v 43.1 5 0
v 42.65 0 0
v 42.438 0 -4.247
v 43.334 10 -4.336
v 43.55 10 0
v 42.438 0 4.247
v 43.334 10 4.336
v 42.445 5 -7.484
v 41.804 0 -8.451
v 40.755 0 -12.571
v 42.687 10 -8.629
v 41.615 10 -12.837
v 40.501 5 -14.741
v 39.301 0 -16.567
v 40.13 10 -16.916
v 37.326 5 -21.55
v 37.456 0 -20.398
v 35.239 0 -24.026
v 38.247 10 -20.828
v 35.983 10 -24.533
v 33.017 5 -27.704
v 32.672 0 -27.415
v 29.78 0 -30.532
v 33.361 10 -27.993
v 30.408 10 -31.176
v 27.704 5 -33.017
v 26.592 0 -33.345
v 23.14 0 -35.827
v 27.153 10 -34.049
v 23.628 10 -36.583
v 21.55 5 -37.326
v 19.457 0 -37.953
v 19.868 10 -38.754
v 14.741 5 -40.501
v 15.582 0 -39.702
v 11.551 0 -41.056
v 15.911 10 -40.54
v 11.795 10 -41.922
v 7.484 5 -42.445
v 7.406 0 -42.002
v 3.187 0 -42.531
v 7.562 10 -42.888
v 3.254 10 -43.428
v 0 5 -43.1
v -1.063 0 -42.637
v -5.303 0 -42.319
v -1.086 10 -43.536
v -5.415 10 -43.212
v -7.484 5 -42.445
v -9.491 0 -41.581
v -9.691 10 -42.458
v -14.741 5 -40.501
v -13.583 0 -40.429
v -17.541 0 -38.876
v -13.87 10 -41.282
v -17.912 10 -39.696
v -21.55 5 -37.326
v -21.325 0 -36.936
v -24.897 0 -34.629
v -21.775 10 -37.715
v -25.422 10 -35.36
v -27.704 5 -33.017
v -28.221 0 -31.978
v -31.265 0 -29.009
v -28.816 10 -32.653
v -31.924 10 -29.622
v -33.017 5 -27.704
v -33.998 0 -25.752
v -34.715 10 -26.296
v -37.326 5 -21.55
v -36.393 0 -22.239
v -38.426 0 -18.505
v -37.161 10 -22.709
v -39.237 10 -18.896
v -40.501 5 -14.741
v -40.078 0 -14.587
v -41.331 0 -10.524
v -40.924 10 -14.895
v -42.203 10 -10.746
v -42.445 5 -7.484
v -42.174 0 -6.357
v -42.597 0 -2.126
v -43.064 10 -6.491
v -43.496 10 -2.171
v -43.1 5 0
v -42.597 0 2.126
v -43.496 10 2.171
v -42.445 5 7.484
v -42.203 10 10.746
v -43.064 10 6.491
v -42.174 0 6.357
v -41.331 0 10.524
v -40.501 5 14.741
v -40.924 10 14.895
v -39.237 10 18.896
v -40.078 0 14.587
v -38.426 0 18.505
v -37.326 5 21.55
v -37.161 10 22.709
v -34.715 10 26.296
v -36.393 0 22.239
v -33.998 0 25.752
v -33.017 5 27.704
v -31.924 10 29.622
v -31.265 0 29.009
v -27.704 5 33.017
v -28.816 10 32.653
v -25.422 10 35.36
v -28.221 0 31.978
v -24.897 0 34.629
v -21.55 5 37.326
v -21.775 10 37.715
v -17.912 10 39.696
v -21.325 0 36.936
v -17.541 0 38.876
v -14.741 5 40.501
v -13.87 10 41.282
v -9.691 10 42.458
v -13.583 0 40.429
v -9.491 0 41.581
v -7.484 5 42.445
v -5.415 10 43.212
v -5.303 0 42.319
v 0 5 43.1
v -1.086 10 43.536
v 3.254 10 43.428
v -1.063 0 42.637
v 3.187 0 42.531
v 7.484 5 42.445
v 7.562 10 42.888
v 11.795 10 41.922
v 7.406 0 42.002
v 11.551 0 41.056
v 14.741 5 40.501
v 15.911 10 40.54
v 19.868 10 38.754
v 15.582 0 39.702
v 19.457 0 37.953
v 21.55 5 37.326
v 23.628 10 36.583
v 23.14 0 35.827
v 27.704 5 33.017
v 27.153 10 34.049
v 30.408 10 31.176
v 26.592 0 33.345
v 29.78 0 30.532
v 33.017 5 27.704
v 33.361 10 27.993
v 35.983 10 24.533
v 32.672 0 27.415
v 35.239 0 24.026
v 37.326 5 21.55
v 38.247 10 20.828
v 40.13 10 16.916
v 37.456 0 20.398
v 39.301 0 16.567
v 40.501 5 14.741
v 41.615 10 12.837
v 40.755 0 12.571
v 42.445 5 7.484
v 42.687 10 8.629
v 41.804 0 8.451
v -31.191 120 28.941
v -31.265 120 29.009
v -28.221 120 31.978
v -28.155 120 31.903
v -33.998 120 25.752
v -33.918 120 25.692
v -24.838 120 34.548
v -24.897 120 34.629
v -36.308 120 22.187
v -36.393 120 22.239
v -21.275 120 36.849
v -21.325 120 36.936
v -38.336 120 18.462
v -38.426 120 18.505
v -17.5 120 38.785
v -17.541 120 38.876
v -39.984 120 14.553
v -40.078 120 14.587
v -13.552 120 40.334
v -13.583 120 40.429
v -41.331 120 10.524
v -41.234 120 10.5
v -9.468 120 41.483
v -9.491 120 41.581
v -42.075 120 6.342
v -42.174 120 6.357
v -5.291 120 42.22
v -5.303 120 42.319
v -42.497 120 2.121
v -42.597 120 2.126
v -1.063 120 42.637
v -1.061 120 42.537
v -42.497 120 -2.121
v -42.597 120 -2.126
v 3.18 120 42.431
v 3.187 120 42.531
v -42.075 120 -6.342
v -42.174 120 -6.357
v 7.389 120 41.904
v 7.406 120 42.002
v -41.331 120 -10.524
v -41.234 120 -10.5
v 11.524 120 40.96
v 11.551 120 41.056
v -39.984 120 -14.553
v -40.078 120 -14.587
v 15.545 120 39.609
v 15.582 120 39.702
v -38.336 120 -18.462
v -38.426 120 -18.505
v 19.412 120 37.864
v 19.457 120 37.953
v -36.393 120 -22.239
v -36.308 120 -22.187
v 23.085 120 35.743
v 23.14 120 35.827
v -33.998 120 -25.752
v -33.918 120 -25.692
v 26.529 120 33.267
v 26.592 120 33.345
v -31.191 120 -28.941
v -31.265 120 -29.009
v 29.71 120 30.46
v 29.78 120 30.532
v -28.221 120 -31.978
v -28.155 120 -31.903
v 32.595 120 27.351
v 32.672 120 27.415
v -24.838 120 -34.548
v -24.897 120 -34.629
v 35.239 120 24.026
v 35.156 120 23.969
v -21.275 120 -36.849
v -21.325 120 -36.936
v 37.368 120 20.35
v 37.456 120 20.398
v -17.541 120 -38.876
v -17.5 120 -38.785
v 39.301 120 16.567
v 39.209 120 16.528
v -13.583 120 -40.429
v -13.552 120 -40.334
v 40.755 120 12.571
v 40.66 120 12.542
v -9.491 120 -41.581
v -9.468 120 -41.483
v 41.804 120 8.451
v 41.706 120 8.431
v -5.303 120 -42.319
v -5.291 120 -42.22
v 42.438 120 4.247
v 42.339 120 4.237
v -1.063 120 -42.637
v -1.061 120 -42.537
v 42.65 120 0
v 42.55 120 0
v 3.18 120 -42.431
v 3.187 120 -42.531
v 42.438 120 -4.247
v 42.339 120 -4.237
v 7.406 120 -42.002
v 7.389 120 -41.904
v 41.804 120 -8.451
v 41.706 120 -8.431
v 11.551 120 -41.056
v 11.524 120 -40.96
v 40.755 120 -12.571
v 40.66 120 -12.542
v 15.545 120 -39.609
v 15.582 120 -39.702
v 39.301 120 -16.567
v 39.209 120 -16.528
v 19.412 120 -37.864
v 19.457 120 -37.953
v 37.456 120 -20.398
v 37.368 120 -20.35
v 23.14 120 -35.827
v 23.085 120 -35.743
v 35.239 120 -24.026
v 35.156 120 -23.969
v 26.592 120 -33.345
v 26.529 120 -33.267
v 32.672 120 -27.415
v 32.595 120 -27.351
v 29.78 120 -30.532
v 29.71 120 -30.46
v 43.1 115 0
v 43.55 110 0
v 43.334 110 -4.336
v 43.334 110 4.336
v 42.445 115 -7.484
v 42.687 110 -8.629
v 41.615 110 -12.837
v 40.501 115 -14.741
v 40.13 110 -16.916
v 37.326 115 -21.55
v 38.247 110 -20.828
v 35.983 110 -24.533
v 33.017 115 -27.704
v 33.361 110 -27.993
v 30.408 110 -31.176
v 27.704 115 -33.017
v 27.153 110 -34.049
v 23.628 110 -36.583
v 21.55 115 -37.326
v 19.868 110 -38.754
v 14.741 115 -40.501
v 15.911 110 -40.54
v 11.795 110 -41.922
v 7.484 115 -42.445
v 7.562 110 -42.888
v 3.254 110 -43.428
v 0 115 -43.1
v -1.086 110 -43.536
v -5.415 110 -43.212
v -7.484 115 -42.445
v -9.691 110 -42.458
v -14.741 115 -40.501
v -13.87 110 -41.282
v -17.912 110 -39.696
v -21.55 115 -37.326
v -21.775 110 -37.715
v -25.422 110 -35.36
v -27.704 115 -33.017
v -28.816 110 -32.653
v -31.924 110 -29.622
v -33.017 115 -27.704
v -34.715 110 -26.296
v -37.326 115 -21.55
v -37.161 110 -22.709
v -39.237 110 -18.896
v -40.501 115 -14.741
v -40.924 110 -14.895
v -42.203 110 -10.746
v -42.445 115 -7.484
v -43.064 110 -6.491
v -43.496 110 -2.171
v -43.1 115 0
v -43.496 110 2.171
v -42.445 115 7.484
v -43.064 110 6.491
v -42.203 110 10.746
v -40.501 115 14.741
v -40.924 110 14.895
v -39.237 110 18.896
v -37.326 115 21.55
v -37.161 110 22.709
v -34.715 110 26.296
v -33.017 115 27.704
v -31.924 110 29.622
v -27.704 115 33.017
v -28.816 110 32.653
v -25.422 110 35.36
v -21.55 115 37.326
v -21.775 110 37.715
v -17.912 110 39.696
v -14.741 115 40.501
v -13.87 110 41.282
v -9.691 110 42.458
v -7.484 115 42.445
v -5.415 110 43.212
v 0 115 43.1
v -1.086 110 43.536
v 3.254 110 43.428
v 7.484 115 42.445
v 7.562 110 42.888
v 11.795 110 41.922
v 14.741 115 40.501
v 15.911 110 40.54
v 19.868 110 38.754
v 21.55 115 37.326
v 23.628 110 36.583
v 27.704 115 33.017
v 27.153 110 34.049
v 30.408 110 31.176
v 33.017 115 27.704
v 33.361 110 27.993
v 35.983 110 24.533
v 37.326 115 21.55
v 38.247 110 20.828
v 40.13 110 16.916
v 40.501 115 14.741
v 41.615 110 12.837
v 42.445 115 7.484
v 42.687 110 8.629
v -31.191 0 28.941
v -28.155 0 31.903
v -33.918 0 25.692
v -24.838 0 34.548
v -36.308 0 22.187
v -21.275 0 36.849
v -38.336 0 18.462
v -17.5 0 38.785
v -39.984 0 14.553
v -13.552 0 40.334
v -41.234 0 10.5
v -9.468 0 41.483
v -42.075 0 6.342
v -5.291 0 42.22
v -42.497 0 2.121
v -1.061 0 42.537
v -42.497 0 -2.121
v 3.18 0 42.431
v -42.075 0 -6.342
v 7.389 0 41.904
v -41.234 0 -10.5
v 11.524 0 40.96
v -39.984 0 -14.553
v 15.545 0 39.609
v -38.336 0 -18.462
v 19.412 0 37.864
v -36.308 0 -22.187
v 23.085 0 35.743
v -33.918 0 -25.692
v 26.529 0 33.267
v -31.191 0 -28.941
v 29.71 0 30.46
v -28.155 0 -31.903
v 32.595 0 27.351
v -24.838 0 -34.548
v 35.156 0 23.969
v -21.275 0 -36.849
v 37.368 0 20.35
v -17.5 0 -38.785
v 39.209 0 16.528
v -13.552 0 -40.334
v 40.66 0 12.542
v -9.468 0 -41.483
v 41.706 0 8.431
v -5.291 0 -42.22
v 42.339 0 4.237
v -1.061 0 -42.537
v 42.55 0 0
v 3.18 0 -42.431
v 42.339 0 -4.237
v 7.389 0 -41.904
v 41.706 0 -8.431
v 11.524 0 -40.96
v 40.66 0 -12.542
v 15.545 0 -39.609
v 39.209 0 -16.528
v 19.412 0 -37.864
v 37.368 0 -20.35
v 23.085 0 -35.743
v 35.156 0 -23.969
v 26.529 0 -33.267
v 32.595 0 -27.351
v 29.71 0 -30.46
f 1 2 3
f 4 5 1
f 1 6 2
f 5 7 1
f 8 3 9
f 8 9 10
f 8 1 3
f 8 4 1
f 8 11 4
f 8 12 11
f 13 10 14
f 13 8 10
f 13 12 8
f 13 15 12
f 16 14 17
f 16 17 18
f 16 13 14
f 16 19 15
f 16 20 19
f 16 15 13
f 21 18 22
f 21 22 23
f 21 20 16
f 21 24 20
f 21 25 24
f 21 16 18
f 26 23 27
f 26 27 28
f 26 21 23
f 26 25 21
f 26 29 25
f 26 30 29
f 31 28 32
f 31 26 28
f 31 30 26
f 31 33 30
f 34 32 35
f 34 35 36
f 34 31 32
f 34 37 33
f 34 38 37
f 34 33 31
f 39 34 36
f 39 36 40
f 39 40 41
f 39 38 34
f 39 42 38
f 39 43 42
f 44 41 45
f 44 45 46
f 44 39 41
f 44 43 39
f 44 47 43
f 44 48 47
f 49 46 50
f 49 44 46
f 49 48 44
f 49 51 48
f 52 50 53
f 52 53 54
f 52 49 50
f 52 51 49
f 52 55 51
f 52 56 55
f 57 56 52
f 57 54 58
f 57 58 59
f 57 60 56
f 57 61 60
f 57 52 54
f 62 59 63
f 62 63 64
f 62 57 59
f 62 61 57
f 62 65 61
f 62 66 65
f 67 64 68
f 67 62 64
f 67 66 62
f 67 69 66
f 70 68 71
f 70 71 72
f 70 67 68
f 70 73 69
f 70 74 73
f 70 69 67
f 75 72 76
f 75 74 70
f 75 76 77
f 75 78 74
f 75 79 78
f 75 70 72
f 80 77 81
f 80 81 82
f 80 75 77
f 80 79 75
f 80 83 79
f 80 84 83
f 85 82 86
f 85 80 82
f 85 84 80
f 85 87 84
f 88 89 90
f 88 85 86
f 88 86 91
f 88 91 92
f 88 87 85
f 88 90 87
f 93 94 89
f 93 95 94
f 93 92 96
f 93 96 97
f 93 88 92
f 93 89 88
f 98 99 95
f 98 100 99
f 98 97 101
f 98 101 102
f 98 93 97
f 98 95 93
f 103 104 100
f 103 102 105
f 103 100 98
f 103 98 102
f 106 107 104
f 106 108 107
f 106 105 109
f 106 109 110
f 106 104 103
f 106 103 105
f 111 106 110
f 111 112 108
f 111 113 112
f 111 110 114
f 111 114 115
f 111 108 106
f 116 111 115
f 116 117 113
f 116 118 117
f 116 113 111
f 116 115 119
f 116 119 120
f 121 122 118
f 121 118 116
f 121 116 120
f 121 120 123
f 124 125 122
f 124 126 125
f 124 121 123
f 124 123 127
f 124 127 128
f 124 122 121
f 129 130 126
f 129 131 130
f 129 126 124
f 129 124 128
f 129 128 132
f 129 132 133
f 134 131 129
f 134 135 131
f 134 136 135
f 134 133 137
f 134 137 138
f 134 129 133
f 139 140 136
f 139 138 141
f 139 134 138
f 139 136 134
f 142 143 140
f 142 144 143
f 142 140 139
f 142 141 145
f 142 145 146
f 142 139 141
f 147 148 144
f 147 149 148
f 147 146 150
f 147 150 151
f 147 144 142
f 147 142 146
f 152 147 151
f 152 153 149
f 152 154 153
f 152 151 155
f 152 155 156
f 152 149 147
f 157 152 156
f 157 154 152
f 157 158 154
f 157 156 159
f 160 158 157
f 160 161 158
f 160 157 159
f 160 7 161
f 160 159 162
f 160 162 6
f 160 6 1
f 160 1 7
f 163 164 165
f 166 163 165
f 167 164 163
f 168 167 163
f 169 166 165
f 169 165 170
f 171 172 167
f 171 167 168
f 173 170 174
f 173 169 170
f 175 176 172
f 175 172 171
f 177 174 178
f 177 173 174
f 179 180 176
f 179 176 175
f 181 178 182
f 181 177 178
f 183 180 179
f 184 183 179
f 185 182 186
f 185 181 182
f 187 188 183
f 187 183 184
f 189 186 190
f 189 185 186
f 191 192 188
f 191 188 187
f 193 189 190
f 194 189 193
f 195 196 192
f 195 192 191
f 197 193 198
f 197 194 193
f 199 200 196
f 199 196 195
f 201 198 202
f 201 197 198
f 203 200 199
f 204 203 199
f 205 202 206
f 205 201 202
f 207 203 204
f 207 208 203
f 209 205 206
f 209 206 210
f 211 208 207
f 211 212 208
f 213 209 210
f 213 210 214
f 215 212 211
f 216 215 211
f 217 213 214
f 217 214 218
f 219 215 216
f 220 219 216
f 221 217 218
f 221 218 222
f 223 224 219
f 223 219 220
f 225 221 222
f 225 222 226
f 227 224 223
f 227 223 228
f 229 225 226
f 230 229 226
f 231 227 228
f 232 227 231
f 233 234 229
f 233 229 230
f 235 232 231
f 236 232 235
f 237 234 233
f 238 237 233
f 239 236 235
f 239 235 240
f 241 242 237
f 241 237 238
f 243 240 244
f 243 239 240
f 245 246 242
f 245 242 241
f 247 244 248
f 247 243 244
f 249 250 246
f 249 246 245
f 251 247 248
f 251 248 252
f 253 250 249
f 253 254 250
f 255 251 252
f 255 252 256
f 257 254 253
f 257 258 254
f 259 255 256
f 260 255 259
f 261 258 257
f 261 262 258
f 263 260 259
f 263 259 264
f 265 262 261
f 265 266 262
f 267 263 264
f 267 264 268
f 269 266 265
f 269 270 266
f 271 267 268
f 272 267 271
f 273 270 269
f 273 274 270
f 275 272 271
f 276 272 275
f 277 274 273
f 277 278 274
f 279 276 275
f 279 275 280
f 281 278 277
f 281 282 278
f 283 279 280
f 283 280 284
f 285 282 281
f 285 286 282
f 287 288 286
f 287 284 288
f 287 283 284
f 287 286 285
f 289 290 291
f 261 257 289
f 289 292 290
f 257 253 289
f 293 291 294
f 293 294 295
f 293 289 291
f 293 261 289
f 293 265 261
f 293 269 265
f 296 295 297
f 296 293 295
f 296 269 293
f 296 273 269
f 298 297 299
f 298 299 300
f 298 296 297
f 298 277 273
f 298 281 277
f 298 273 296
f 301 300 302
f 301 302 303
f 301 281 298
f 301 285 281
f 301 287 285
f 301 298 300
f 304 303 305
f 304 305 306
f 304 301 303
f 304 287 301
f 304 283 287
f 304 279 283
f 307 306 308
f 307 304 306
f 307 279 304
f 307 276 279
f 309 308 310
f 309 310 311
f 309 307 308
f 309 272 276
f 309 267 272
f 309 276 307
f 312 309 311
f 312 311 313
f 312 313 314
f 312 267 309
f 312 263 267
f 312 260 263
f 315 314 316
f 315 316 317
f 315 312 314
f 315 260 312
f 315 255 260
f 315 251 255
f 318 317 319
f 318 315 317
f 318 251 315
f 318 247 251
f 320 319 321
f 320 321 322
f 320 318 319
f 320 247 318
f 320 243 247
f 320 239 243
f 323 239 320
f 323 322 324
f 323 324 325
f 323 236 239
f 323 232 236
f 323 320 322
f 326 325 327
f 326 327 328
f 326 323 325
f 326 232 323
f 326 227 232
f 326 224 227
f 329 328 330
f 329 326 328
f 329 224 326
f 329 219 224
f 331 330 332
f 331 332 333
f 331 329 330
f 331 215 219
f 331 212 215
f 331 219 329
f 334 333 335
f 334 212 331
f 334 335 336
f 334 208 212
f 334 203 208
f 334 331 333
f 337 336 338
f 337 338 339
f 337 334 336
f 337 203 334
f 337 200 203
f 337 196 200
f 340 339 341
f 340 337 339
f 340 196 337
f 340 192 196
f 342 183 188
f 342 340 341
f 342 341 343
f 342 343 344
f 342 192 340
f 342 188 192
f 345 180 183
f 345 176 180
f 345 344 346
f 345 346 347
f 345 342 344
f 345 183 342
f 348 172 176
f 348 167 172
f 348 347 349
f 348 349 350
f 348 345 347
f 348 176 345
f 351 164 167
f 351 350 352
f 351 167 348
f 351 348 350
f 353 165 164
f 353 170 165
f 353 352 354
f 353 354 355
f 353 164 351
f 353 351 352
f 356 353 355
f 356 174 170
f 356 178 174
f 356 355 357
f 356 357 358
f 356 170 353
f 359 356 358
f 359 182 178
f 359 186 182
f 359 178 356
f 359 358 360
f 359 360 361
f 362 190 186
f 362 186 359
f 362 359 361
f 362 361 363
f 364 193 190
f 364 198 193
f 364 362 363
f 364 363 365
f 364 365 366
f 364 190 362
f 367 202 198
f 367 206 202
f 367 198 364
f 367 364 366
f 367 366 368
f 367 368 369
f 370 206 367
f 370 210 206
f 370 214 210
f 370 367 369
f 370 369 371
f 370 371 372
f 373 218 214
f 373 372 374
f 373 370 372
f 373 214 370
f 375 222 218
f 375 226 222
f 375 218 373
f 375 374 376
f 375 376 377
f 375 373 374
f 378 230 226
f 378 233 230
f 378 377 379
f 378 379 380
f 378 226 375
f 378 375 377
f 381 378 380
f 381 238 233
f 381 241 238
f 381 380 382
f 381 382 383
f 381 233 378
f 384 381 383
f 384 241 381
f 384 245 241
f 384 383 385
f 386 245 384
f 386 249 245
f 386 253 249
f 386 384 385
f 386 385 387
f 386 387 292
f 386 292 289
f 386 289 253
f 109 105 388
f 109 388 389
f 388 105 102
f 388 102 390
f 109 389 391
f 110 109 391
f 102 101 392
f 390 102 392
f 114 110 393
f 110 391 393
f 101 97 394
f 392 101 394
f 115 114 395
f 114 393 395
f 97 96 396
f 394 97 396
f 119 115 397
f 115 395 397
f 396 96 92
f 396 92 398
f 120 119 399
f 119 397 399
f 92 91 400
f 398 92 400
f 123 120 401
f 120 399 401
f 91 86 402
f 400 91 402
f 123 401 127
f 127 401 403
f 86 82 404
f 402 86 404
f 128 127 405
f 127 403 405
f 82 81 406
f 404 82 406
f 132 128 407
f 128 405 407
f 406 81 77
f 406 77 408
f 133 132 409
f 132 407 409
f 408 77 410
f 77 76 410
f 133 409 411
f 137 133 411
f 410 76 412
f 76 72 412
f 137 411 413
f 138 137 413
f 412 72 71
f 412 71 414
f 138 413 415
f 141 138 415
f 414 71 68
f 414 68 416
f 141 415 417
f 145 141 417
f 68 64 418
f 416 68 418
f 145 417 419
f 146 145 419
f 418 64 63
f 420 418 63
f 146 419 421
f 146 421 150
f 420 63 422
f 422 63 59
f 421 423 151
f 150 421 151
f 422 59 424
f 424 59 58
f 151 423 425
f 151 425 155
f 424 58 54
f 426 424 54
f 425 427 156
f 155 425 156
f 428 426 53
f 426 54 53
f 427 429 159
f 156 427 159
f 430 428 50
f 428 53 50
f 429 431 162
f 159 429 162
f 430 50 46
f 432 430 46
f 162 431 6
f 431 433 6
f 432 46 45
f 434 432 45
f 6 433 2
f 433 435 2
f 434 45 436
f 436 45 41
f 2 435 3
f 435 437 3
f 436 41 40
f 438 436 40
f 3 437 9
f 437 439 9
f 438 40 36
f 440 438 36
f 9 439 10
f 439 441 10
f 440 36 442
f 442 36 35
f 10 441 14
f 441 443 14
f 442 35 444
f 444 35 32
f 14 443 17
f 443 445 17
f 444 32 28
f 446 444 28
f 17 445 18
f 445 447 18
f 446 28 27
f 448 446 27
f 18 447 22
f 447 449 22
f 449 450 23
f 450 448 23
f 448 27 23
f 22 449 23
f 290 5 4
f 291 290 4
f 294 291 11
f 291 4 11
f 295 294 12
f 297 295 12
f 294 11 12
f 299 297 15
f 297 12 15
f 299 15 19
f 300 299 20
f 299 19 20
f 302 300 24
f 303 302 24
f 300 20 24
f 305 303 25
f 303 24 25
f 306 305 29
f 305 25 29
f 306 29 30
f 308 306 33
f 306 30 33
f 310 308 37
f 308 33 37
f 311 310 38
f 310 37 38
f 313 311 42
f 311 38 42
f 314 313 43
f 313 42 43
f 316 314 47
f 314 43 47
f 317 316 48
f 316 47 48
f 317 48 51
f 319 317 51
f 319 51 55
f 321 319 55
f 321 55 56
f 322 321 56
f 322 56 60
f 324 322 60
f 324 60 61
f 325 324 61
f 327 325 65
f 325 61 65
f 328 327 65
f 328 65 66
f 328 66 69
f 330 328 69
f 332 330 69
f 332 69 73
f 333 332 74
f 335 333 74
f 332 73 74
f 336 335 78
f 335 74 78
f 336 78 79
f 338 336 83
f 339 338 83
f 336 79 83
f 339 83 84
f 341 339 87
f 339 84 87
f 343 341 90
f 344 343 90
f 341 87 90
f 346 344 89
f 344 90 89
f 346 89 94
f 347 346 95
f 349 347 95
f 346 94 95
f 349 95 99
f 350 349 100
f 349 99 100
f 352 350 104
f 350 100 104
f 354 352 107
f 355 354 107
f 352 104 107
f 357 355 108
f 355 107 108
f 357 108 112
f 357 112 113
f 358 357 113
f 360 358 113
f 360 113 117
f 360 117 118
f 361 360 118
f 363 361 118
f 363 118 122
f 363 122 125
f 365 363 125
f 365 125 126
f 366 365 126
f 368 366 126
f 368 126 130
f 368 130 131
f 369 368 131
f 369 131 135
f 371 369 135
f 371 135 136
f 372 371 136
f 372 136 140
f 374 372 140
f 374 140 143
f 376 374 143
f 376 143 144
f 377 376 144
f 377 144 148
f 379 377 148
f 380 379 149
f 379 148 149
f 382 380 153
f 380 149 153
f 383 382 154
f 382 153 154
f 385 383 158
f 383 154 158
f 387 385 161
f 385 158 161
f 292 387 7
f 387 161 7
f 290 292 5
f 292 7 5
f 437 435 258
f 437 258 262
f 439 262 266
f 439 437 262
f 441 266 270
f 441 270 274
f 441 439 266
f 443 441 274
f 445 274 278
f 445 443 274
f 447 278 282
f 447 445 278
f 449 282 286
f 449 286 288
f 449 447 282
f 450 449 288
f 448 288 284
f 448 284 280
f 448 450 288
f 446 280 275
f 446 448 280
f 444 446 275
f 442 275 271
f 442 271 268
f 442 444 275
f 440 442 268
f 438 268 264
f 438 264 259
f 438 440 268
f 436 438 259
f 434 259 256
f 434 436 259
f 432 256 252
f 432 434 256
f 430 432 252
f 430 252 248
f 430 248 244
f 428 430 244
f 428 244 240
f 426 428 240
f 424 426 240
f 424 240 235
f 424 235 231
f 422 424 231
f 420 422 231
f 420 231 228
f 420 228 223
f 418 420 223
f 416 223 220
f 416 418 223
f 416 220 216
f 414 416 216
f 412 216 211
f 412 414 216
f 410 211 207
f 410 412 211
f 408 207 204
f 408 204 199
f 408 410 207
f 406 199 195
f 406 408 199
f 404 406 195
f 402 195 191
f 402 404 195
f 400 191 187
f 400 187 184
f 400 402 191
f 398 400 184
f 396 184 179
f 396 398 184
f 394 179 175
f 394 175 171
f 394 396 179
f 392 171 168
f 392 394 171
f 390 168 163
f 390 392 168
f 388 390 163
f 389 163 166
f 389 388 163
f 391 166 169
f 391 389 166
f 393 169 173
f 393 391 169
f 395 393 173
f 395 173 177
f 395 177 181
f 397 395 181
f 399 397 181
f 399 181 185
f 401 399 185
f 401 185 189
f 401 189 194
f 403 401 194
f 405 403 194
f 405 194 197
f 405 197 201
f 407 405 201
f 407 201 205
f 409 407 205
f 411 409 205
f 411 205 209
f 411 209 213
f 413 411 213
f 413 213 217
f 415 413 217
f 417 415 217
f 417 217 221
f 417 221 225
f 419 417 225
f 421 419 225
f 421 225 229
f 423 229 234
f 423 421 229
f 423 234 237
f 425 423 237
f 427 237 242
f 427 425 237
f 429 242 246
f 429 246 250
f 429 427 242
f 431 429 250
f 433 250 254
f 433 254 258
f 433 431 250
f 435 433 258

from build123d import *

# Parameters (mm, degrees)
SKETCH1_R           = 43.55
SKETCH1_R_2         = 42.55
BOSS_EXTRUDE1_DEPTH = 120
CHAMFER1_SIZE       = 10
CHAMFER1_SIZE2      = 0.9
CHAMFER2_SIZE       = 0.9
CHAMFER2_SIZE2      = 10


with BuildPart() as part:
    # Sketch1 → Boss-Extrude1 (new body)
    with BuildSketch(Plane(origin=(0, 0, 0), x_dir=(1, 0, 0), z_dir=(0, 1, 0))):
        Circle(SKETCH1_R)
        Circle(SKETCH1_R_2, mode=Mode.SUBTRACT)
    extrude(amount=BOSS_EXTRUDE1_DEPTH)

    # Chamfer1
    chamfer1_edges = [part.edges().sort_by_distance(p)[0] for p in [
        (-43.55, 120, 0),
    ]]
    chamfer1_side = [part.faces().sort_by_distance(p)[0] for p in [
        (-43.55, 60, 0),
    ]]
    chamfer(chamfer1_edges, length=CHAMFER1_SIZE, length2=CHAMFER1_SIZE2, reference=chamfer1_side[0])

    # Chamfer2
    chamfer2_edges = [part.edges().sort_by_distance(p)[0] for p in [
        (-43.55, 0, 0),
    ]]
    chamfer2_side = [part.faces().sort_by_distance(p)[0] for p in [
        (-43.426821999, 0, 0),
    ]]
    chamfer(chamfer2_edges, length=CHAMFER2_SIZE, length2=CHAMFER2_SIZE2, reference=chamfer2_side[0])


solid = part.part
